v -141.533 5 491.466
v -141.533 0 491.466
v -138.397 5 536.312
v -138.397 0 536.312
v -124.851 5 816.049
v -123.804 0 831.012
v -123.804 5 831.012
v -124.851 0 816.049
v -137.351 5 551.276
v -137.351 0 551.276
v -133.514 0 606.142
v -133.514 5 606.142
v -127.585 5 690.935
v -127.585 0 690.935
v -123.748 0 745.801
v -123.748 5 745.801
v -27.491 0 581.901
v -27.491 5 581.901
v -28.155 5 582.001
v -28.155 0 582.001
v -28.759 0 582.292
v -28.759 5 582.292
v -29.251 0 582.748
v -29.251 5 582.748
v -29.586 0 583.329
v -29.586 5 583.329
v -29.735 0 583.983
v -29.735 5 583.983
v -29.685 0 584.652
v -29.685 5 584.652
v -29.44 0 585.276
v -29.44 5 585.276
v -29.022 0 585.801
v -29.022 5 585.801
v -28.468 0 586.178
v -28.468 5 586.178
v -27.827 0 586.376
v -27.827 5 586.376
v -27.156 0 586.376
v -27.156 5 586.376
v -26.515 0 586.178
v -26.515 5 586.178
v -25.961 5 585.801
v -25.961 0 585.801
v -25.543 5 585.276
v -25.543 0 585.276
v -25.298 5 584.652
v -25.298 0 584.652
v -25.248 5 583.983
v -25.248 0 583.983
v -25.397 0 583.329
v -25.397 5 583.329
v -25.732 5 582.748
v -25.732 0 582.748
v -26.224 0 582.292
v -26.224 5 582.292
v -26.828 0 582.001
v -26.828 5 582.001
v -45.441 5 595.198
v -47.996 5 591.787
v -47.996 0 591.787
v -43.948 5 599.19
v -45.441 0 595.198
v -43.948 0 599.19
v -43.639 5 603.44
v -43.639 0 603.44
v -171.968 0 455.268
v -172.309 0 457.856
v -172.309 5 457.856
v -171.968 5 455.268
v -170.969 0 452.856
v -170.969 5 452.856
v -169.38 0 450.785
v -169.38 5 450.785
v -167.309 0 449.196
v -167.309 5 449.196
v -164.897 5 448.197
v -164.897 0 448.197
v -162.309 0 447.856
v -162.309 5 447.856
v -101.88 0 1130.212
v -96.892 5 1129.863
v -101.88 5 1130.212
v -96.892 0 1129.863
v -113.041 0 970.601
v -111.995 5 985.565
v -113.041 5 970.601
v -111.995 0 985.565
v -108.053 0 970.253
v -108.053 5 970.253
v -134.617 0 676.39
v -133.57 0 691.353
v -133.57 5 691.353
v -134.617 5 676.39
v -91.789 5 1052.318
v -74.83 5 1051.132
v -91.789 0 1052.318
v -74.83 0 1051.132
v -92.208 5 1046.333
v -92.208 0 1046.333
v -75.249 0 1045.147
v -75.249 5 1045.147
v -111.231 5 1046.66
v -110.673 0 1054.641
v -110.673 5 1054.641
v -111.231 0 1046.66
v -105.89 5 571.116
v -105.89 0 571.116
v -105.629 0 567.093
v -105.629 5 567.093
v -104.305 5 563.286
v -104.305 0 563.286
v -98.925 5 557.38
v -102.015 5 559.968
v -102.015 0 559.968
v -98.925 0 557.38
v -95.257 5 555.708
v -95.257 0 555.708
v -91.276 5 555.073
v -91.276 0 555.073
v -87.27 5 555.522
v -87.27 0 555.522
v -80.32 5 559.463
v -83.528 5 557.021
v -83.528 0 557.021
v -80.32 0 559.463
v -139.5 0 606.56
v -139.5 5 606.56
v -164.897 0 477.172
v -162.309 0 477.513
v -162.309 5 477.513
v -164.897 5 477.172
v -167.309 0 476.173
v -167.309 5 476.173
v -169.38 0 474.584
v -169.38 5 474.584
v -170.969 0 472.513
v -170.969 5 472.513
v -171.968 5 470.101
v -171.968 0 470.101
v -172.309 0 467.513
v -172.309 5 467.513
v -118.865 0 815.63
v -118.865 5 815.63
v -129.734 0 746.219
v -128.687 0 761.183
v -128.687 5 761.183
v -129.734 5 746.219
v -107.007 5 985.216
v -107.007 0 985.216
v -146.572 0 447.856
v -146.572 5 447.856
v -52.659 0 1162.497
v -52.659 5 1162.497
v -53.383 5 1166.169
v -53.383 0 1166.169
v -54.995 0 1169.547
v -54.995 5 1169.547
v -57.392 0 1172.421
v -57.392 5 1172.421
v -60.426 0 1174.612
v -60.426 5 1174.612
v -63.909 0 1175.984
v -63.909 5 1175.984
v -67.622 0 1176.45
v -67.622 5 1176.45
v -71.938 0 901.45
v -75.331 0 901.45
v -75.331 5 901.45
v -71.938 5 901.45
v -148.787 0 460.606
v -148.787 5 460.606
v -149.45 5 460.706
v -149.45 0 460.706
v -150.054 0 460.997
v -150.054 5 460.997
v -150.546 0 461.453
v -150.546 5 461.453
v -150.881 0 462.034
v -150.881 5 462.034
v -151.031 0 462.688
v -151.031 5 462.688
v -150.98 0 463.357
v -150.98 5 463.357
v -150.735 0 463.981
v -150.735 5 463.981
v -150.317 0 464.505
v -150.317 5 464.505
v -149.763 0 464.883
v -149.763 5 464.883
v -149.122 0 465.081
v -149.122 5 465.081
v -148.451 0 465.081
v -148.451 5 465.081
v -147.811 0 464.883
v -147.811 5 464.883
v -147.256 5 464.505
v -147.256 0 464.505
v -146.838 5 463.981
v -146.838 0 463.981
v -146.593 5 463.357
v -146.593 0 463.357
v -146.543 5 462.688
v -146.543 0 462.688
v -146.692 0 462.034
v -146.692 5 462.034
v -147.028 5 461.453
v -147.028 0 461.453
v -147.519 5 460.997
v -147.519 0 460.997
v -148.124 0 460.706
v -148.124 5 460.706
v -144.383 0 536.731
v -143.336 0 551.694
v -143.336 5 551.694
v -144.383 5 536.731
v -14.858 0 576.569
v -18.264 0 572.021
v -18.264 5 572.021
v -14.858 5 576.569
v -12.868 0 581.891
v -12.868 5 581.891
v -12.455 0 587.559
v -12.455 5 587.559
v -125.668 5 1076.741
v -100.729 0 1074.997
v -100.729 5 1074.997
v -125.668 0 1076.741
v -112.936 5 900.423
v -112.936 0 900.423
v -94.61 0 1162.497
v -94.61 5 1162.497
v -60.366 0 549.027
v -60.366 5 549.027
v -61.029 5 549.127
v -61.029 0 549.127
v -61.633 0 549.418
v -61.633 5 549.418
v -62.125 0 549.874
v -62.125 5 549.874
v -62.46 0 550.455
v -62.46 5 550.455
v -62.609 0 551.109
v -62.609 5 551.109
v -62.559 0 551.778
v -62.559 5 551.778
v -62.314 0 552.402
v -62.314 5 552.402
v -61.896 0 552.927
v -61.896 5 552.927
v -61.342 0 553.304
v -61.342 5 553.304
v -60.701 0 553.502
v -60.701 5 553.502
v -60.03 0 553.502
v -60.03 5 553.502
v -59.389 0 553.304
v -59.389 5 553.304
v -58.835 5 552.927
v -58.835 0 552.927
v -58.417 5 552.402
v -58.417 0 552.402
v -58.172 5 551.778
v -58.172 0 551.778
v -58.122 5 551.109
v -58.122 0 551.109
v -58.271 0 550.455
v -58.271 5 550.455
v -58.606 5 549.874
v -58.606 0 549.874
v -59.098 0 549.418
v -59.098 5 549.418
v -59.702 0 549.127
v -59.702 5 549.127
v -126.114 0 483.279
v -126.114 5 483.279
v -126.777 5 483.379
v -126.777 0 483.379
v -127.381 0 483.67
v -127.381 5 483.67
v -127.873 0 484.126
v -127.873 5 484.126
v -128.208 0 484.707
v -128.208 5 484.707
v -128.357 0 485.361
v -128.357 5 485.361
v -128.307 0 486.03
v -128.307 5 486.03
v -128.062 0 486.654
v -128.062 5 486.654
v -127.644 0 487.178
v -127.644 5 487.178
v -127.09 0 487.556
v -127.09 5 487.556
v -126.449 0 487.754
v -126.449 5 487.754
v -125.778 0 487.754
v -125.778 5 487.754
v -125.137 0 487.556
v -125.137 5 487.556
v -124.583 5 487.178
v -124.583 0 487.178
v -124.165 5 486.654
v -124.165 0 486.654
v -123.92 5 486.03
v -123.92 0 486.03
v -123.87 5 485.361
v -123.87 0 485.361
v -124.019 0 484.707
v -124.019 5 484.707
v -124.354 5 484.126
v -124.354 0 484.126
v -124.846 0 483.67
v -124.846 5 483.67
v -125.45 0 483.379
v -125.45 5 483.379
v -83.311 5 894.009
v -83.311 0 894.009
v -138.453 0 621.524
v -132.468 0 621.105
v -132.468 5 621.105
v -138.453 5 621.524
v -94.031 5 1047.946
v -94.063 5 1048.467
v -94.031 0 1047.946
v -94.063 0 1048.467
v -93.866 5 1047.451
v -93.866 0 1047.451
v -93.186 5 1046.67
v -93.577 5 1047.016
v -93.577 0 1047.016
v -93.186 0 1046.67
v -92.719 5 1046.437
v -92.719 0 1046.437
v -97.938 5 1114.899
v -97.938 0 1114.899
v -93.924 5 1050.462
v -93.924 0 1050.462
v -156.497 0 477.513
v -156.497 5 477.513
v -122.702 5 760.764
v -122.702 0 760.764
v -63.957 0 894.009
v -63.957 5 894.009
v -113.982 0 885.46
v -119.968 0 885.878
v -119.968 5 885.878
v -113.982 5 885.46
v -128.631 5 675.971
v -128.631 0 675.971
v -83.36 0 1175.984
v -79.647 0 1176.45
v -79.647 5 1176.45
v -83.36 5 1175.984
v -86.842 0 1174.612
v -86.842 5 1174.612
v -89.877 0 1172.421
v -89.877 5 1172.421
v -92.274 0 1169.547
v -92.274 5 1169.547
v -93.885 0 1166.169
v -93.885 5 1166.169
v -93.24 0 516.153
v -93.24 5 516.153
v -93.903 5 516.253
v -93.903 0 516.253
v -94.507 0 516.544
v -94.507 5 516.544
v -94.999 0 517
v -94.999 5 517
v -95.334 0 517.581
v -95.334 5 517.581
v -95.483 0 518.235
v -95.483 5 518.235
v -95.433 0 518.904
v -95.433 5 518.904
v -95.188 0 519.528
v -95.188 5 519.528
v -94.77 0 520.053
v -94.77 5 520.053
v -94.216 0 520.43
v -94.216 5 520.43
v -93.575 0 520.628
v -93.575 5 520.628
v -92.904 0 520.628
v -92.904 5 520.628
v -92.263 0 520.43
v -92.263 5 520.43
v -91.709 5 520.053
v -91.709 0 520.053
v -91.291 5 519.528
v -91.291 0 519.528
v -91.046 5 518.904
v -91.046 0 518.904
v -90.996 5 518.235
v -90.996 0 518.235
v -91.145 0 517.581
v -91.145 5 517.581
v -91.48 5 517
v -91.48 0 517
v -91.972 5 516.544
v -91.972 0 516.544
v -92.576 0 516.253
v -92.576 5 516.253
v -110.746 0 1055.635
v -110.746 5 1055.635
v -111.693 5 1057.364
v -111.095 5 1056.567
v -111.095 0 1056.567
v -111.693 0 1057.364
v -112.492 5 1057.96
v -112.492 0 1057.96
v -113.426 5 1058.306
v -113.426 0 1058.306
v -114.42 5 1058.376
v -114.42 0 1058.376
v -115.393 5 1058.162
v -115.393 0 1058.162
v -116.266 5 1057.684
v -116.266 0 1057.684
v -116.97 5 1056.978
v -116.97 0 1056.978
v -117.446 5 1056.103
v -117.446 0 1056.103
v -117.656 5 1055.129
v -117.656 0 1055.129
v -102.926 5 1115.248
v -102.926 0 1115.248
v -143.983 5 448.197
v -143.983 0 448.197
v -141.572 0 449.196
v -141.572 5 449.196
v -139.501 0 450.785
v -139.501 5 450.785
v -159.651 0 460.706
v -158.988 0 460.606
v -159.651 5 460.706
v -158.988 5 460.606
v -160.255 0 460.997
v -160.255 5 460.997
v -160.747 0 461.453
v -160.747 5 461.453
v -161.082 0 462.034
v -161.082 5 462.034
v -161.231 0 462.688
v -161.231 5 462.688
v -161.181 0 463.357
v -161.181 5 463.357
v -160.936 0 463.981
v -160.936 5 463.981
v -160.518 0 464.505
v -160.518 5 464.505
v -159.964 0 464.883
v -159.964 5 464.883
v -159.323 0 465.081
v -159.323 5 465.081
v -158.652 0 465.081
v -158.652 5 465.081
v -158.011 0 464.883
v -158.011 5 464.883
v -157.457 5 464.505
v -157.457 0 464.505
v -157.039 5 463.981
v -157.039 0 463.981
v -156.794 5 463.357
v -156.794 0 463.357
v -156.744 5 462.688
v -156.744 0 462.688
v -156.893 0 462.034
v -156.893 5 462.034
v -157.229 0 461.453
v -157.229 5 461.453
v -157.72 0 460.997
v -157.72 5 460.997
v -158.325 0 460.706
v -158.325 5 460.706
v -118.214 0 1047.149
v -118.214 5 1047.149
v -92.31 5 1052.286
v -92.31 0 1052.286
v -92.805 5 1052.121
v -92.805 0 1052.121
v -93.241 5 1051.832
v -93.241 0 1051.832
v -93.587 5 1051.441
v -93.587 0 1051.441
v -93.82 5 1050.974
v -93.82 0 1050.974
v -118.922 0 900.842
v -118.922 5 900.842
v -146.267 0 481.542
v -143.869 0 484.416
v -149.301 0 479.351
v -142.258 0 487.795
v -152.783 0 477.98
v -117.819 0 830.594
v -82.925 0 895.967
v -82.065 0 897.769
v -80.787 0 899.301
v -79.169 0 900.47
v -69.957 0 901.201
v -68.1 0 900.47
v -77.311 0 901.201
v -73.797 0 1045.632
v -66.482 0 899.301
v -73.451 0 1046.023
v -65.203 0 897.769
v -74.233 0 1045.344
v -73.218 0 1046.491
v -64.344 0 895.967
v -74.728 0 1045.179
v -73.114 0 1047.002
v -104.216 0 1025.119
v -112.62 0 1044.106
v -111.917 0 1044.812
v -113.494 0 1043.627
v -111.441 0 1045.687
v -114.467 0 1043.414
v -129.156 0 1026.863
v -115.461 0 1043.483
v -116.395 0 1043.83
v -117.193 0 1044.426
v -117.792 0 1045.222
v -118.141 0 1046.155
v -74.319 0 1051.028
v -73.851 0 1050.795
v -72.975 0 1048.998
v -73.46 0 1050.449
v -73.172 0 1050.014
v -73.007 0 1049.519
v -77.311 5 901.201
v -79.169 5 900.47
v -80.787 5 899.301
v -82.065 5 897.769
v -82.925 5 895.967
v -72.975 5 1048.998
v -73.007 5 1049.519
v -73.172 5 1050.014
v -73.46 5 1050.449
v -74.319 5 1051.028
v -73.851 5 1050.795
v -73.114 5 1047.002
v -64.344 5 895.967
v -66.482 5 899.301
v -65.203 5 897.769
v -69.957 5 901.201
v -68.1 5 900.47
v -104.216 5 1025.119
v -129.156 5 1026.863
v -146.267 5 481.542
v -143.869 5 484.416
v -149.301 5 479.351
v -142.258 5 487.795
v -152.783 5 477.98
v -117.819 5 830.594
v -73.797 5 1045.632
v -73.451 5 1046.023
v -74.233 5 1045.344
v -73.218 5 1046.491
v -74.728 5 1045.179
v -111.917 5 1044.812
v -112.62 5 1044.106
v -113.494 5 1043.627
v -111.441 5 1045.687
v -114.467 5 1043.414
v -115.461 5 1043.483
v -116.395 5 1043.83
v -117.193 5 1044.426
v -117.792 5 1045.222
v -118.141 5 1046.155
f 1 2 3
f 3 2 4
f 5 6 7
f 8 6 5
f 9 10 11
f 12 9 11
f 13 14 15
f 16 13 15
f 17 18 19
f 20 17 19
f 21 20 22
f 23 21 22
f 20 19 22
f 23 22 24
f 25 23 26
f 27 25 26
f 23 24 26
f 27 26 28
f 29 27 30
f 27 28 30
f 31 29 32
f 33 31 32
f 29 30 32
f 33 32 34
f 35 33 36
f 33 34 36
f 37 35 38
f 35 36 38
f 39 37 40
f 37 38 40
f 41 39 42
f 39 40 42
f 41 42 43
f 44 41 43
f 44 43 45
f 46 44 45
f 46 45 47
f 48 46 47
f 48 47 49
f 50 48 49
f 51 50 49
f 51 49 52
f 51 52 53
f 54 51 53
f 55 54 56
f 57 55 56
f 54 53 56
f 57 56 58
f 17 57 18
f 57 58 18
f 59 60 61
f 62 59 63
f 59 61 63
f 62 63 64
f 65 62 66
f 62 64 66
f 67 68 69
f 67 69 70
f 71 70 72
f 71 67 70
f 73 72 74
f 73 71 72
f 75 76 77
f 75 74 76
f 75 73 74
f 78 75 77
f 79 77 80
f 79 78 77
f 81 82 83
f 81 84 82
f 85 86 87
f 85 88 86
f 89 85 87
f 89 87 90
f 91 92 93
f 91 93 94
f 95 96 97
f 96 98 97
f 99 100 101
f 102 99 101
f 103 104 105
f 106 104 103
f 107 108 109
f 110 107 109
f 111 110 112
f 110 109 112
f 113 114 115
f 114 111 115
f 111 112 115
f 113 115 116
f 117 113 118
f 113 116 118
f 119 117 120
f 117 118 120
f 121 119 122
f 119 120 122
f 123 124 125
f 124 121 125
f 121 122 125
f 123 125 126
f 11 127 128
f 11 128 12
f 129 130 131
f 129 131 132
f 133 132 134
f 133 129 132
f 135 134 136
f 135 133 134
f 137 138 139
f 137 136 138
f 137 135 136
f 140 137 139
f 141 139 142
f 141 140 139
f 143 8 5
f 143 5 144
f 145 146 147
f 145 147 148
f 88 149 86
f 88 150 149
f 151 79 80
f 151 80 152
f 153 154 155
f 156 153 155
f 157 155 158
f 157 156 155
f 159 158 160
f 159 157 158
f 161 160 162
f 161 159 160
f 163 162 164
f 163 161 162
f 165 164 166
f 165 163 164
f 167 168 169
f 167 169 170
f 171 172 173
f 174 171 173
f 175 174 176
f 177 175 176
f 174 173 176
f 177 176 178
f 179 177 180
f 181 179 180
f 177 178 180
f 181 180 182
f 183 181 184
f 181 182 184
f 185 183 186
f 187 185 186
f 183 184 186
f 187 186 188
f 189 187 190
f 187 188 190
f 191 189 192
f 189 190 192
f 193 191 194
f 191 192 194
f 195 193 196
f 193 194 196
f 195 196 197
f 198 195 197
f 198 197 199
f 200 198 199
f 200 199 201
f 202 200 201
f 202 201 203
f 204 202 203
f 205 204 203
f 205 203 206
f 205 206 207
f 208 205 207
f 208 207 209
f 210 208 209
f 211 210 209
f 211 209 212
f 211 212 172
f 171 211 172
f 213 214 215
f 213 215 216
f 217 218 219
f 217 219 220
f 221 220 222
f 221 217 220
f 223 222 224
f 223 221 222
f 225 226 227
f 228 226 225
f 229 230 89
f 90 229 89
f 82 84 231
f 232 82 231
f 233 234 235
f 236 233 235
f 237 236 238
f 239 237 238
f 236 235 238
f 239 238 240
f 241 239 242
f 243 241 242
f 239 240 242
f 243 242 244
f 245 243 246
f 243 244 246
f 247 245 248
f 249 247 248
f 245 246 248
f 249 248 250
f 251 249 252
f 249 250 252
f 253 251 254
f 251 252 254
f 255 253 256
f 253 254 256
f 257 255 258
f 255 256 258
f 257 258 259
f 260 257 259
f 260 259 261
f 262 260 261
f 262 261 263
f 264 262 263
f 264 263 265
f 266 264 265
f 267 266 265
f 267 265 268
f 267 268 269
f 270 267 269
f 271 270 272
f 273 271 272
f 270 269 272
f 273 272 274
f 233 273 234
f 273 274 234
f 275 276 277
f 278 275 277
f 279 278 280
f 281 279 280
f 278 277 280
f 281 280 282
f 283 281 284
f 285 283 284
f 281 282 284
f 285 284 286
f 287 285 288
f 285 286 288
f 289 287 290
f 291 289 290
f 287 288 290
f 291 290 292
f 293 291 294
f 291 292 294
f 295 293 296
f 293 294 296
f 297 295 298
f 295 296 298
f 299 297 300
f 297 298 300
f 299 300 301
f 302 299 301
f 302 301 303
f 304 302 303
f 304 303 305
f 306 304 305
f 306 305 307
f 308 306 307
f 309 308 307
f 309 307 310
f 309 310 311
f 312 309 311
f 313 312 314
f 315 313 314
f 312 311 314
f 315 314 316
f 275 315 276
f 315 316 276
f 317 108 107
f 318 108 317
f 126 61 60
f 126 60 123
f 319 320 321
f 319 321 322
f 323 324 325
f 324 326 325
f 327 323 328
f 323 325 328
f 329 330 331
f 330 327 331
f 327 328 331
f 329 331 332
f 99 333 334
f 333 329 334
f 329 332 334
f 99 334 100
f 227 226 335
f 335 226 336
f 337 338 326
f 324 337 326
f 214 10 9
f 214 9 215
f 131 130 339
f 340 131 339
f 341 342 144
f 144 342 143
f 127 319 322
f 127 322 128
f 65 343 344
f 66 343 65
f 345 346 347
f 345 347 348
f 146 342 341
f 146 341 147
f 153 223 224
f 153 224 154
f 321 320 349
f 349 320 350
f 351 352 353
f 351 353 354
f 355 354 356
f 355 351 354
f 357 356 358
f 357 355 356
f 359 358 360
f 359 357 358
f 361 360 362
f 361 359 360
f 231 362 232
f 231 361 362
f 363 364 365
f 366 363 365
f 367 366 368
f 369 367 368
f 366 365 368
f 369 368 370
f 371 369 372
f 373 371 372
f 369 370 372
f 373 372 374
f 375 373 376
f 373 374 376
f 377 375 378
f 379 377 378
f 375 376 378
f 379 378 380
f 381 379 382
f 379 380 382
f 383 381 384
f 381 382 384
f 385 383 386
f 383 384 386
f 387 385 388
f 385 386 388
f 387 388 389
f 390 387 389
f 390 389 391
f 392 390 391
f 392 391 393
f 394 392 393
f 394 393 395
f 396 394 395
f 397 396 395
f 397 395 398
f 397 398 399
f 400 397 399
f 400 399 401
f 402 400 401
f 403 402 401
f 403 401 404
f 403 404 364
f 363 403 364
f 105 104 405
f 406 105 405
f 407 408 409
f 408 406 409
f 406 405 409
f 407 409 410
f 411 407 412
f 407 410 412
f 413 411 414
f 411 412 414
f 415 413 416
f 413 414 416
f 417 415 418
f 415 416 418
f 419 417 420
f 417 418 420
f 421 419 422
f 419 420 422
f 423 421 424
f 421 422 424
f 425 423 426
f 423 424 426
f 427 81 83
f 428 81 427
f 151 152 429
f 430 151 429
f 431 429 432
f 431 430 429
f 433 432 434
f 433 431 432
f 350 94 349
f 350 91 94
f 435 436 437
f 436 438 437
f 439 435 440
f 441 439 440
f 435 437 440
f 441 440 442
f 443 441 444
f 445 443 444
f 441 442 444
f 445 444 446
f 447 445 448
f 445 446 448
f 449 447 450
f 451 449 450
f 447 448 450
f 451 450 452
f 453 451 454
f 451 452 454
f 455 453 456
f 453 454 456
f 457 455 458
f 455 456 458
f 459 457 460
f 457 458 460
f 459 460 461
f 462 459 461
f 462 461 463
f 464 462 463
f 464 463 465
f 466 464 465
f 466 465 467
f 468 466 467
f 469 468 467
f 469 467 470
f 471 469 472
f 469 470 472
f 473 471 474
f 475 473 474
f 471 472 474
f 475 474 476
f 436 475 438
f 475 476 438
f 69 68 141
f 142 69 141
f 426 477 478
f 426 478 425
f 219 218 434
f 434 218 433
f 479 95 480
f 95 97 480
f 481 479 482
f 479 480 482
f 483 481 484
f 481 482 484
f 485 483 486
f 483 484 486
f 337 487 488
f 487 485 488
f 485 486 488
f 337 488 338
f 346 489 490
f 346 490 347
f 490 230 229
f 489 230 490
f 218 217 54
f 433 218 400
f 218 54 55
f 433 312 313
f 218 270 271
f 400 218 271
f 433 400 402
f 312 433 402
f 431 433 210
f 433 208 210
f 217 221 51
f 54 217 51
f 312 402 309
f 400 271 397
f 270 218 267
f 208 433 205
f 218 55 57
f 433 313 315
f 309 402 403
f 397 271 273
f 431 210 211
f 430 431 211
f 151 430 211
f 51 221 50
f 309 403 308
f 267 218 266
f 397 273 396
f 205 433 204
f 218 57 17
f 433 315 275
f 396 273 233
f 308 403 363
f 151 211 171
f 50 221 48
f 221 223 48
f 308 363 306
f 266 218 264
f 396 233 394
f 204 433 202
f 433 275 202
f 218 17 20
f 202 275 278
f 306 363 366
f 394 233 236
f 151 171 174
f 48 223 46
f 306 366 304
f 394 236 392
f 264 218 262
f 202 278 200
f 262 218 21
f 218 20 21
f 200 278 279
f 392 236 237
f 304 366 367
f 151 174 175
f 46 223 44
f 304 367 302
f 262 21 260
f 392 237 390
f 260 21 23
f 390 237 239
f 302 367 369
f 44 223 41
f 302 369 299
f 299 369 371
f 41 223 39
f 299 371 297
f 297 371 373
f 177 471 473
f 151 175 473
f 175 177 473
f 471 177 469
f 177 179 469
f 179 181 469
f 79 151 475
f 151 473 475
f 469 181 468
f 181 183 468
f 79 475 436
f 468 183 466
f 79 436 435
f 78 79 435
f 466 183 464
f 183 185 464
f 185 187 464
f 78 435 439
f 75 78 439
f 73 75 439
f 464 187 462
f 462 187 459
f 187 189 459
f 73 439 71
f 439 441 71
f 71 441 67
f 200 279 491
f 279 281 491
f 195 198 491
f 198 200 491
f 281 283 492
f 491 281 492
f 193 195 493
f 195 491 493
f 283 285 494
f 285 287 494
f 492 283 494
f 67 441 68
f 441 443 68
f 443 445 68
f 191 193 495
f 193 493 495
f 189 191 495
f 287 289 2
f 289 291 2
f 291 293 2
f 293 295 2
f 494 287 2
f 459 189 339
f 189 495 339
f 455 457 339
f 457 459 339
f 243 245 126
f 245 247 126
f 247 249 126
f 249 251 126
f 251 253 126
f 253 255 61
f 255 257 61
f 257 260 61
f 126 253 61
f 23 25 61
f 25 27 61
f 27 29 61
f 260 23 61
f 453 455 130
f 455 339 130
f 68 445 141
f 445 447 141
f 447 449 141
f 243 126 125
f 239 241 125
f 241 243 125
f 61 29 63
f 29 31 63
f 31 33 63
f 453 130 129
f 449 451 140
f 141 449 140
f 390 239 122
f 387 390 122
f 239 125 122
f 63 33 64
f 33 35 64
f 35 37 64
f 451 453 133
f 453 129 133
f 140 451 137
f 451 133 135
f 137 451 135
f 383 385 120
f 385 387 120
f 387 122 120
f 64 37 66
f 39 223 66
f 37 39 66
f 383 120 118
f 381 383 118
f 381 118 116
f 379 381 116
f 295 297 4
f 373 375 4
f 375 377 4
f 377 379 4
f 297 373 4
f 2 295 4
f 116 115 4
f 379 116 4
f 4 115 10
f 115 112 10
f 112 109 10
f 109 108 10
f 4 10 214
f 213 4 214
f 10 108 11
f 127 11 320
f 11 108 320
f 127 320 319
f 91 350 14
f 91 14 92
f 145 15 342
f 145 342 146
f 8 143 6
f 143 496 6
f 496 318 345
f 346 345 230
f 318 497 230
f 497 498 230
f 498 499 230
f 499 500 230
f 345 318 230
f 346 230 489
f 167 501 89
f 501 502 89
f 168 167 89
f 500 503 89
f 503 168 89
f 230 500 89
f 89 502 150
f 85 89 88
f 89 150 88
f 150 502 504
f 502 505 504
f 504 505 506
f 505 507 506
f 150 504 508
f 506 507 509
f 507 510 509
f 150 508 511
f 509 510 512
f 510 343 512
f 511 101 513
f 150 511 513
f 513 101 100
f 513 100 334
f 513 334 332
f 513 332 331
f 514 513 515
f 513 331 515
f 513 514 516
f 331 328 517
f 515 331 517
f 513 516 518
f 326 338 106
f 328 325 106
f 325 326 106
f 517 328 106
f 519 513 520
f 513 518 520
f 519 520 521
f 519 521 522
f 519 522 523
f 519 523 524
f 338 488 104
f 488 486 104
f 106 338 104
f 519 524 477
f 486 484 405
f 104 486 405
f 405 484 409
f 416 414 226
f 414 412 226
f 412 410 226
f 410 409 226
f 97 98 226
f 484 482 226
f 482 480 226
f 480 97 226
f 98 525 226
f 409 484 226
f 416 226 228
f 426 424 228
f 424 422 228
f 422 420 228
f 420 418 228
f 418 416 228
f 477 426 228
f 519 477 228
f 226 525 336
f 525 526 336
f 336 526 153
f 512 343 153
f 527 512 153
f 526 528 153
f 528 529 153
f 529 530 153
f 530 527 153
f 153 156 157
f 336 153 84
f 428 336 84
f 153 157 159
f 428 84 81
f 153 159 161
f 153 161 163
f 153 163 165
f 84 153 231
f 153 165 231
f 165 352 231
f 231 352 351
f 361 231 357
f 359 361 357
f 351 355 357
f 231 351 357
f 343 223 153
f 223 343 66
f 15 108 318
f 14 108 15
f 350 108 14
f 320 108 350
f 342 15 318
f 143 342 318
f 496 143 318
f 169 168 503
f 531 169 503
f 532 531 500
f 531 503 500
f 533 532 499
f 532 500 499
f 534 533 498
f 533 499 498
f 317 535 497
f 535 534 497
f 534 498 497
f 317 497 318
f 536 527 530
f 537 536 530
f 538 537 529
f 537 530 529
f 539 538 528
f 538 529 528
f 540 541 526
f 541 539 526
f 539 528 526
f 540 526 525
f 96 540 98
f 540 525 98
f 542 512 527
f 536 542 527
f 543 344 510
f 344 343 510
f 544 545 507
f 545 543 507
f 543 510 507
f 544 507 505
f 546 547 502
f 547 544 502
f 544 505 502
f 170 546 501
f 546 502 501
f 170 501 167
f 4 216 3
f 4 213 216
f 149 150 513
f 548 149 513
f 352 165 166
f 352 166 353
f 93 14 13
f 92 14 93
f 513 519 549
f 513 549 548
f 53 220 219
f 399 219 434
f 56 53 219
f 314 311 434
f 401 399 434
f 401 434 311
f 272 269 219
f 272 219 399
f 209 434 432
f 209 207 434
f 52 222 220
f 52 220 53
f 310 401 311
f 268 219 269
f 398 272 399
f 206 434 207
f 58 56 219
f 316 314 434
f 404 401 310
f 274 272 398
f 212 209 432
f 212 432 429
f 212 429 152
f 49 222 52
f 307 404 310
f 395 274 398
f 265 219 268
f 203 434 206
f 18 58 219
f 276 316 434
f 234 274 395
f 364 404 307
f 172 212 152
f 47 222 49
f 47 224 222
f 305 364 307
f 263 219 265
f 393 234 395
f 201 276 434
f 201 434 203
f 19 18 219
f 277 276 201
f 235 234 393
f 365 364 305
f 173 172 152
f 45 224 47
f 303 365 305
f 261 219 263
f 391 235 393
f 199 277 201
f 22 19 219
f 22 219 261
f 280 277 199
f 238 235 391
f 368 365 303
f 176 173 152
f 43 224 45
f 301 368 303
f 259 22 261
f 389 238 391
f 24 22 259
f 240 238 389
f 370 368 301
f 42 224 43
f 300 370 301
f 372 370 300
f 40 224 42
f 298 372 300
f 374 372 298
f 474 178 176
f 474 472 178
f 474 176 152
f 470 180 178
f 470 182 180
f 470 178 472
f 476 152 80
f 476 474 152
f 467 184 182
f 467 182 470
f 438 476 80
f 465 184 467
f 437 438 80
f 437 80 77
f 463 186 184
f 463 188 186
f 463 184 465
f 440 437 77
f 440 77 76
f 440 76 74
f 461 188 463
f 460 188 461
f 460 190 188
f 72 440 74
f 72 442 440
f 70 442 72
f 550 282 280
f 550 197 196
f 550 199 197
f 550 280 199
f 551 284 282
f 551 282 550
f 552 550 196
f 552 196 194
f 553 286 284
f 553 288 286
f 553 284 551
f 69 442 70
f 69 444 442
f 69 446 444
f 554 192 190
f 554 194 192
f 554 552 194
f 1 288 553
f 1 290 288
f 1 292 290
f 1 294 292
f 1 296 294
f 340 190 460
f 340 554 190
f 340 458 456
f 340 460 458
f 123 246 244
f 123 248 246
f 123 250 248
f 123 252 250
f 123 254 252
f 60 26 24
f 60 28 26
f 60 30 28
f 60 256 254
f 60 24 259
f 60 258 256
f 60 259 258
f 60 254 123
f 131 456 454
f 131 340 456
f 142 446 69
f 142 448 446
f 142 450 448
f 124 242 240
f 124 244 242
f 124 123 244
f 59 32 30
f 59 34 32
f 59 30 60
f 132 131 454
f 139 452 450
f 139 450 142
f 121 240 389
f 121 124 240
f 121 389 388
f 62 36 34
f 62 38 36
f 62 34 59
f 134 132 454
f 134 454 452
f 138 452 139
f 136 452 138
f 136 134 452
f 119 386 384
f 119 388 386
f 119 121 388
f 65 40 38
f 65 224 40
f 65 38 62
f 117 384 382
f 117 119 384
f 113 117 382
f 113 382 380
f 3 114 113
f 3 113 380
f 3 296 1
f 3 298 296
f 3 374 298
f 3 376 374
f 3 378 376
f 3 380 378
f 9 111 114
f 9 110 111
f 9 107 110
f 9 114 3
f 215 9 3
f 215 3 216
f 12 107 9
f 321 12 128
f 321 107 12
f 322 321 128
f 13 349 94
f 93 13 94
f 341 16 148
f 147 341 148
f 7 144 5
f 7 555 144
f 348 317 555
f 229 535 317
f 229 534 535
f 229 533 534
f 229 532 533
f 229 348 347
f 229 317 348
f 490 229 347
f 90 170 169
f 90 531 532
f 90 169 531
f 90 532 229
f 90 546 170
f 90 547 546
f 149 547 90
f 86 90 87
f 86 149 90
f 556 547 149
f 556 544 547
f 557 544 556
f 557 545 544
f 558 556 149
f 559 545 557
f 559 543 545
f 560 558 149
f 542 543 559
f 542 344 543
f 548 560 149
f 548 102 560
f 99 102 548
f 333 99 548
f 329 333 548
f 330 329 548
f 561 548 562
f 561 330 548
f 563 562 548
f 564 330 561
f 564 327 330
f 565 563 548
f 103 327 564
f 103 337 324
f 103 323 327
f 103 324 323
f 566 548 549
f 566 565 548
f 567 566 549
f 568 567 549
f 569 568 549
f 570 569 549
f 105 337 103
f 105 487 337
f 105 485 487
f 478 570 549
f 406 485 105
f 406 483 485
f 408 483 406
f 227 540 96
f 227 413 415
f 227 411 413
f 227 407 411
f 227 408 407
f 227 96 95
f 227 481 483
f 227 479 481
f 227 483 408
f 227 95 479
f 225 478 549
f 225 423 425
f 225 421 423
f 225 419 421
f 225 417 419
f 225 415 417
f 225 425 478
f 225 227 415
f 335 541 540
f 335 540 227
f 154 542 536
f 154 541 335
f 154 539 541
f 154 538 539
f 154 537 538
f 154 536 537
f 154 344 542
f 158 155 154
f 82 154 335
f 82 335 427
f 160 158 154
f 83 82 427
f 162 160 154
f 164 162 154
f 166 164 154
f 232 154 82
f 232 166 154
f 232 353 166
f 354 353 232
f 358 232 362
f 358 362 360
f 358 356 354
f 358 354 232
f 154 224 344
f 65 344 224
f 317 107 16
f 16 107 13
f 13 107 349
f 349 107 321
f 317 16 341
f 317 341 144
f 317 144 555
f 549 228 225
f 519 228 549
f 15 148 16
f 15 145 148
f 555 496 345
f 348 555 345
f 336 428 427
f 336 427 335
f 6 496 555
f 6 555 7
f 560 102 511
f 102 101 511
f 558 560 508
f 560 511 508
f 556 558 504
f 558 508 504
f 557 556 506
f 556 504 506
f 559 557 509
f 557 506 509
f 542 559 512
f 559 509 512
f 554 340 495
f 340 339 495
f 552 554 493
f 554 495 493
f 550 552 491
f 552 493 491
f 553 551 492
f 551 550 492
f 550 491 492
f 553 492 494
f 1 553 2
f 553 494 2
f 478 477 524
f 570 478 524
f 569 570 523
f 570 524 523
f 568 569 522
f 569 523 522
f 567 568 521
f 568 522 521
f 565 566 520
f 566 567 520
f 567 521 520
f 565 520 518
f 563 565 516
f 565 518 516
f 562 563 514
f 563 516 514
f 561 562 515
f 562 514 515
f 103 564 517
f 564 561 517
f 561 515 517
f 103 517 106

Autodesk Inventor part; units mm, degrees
ref_plane "YZ Plane" through (0, 0, 0) normal (1, 0, 0) x (0, 1, 0)
ref_plane "XZ Plane" through (0, 0, 0) normal (0, 1, 0) x (-1, 0, 0)
ref_plane "XY Plane" through (0, 0, 0) normal (0, 0, 1) x (1, 0, 0)
sketch "Szkic1" plane through (0, 0, 0) normal (0, 1, 0) x (-1, 0, 0)
  line L0 (-19, 622) -> (11, 622) construction
  line L1 (11, 622) -> (147, 486) construction
  line L2 (147, 486) -> (176.8016, 486) construction
  line L3 (176.8016, 486) -> (176.8016, 461) construction
  line L4 (-19, 622) -> (-19, 609.2855) construction
  line L5 (-19, 609.2855) -> (176.8016, 413.4839) construction
  line L6 (176.8016, 413.4839) -> (176.8016, 461) construction
  line L7 (176.8016, 486) -> (176.8016, 1189) construction
  line L8 (146.8016, 1189) -> (146.8016, 533) construction
  line L9 (246.8016, 495.9837) -> (246.8016, 1189) construction
  line L10 (-47, 922) -> (309, 922) construction
  line L11 (-42, 1147) -> (293, 1147) construction
  line L12 (12.455, 587.5586) -> (52.6586, 1162.4969)
  line L13 (67.6221, 1176.4505) -> (79.6466, 1176.4505)
  line L14 (147, 486) -> (147, 443.2855) construction
  line L15 (147, 486) -> (142.6159, 490.3841) construction
  line L16 (142.6159, 490.3841) -> (121.2587, 469.0268) construction
  line L17 (18.2642, 572.0213) -> (139.5006, 450.7849)
  line L18 (-99.7145, 690) -> (195.2855, 395) construction
  line L19 (172.3089, 417.9767) -> (172.3089, 447.856) construction
  line L20 (176.8016, 486) -> (315.5485, 347.2531) construction
  line L21 (141.5331, 491.4664) -> (138.3972, 536.3123)
  line L22 (162.3089, 477.5127) -> (156.4966, 477.5127)
  line L23 (162.3089, 447.856) -> (146.5717, 447.856)
  arc A0 (12.455, 587.5586) -> (18.2642, 572.0213) centre (32.4063, 586.1635) ccw
  line L24 (142.4296, 447.856) -> (172.3089, 417.9767) construction
  line L25 (172.3089, 457.856) -> (172.3089, 467.5127)
  arc A1 (141.5331, 491.4664) -> (156.4966, 477.5127) centre (156.4966, 492.5127) ccw
  arc A2 (172.3089, 467.5127) -> (162.3089, 477.5127) centre (162.3089, 467.5127) ccw
  arc A3 (162.3089, 447.856) -> (172.3089, 457.856) centre (162.3089, 457.856) ccw
  arc A4 (139.5006, 450.7849) -> (146.5717, 447.856) centre (146.5717, 457.856) ccw
  arc A5 (94.6101, 1162.4969) -> (79.6466, 1176.4505) centre (79.6466, 1161.4505) ccw
  arc A6 (67.6221, 1176.4505) -> (52.6586, 1162.4969) centre (67.6221, 1161.4505) ccw
  line L26 (141.5331, 491.4664) -> (144.7446, 445.541) construction
  line L27 (141.5331, 491.4664) -> (141.5331, 448.7524) construction
  line L28 (-28.6025, 640.2452) -> (163.5033, 448.1395) construction
  line L29 (47.7855, 542.5) -> (47.7855, 585.2145) construction
  line L30 (-4, 664.8499) -> (-4, 551.9978) construction
  line L31 (11, 622) -> (11, 579.2855) construction
  line L32 (11, 579.2855) -> (15.3841, 574.9015) construction
  line L33 (15.3841, 574.9015) -> (36.7413, 596.2587) construction
  line L34 (161.8016, 495.9837) -> (161.8016, 402) construction
  line L35 (104.2165, 1025.1187) -> (100.7287, 1074.9969) construction
  line L36 (100.7287, 1074.9969) -> (125.6678, 1076.7408)
  line L37 (125.6678, 1076.7408) -> (129.1556, 1026.8626)
  line L38 (129.1556, 1026.8626) -> (104.2165, 1025.1187)
  line L39 (100.7287, 1074.9969) -> (97.9384, 1114.8994)
  line L40 (104.2165, 1025.1187) -> (100.7287, 1074.9969) construction
  line L41 (73.1142, 1047.0024) -> (72.9747, 1048.9975)
  line L42 (74.8303, 1051.1322) -> (91.7889, 1052.318)
  line L43 (93.9236, 1050.4624) -> (94.0631, 1048.4673)
  line L44 (92.2075, 1046.3326) -> (75.2489, 1045.1468)
  line L45 (93.9933, 1049.4649) -> (102.4726, 1050.0578) construction
  line L46 (102.4726, 1050.0578) -> (114.4434, 1050.8949) construction
  arc A7 (74.8303, 1051.1322) -> (72.9747, 1048.9975) centre (74.9699, 1049.137) ccw
  arc A8 (73.1142, 1047.0024) -> (75.2489, 1045.1468) centre (75.1094, 1047.1419) ccw
  arc A9 (93.9236, 1050.4624) -> (91.7889, 1052.318) centre (91.9284, 1050.3229) ccw
  arc A10 (92.2075, 1046.3326) -> (94.0631, 1048.4673) centre (92.068, 1048.3278) ccw
  line L47 (116.505, 1021.4131) -> (111.1905, 1097.4131) construction
  line L48 (114.9666, 1043.4131) -> (113.9202, 1058.3766) construction
  line L49 (118.2139, 1047.1488) -> (117.6558, 1055.1293)
  line L50 (110.6729, 1054.641) -> (111.2309, 1046.6605)
  arc A11 (111.2309, 1046.6605) -> (118.2139, 1047.1488) centre (114.7224, 1046.9046) ccw
  arc A12 (117.6558, 1055.1293) -> (110.6729, 1054.641) centre (114.1644, 1054.8851) ccw
  line L51 (47.9957, 591.7873) -> (80.3202, 559.4628)
  line L52 (105.8902, 571.1158) -> (83.3114, 894.0086)
  line L53 (75.3309, 901.4505) -> (71.9379, 901.4505)
  line L54 (63.9574, 894.0086) -> (43.6388, 603.4402)
  arc A13 (43.6388, 603.4402) -> (47.9957, 591.7873) centre (58.6023, 602.3939) ccw
  arc A14 (80.3202, 559.4628) -> (105.8902, 571.1158) centre (90.9268, 570.0694) ccw
  arc A15 (83.3114, 894.0086) -> (75.3309, 901.4505) centre (75.3309, 893.4505) ccw
  arc A16 (71.9379, 901.4505) -> (63.9574, 894.0086) centre (71.9379, 893.4505) ccw
  line L55 (97.9384, 1114.8994) -> (96.8921, 1129.8629) construction
  line L56 (96.8921, 1129.8629) -> (101.8799, 1130.2117)
  line L57 (101.8799, 1130.2117) -> (102.9263, 1115.2482)
  line L58 (102.9263, 1115.2482) -> (97.9384, 1114.8994)
  line L59 (97.9384, 1114.8994) -> (112.9384, 1114.8994) construction
  line L60 (97.9384, 1114.8994) -> (96.8921, 1129.8629) construction
  line L61 (96.8921, 1129.8629) -> (94.6101, 1162.4969)
  line L62 (107.0068, 985.2161) -> (111.9946, 985.5649)
  line L63 (111.9946, 985.5649) -> (113.041, 970.6014)
  line L64 (113.041, 970.6014) -> (108.0531, 970.2527)
  line L65 (107.0068, 985.2161) -> (104.2165, 1025.1187)
  line L66 (108.0531, 970.2527) -> (107.0068, 985.2161) construction
  line L67 (138.3972, 536.3123) -> (137.3509, 551.2758)
  line L68 (137.3509, 551.2758) -> (143.3362, 551.6943)
  line L69 (143.3362, 551.6943) -> (144.3826, 536.7308)
  line L70 (144.3826, 536.7308) -> (138.3972, 536.3123)
  line L71 (138.3972, 536.3123) -> (153.3972, 536.3123) construction
  line L72 (131.9463, 1052.1188) -> (62.9796, 1047.2962) construction
  line L73 (137.3509, 551.2758) -> (108.0531, 970.2527)
  line L74 (138.3972, 536.3123) -> (137.3509, 551.2758) construction
  line L75 (138.4533, 621.5238) -> (139.4996, 606.5603)
  line L76 (139.4996, 606.5603) -> (133.5142, 606.1418)
  line L77 (132.4679, 621.1052) -> (138.4533, 621.5238)
  line L78 (133.5142, 606.1418) -> (132.4679, 621.1052)
  line L79 (133.5703, 691.3533) -> (134.6167, 676.3898)
  line L80 (134.6167, 676.3898) -> (128.6313, 675.9713)
  line L81 (127.5849, 690.9347) -> (133.5703, 691.3533)
  line L82 (128.6313, 675.9713) -> (127.5849, 690.9347)
  line L83 (128.6874, 761.1827) -> (129.7337, 746.2193)
  line L84 (129.7337, 746.2193) -> (123.7483, 745.8007)
  line L85 (122.702, 760.7642) -> (128.6874, 761.1827)
  line L86 (123.7483, 745.8007) -> (122.702, 760.7642)
  line L87 (123.8044, 831.0122) -> (124.8508, 816.0488)
  line L88 (124.8508, 816.0488) -> (118.8654, 815.6302)
  line L89 (117.819, 830.5937) -> (123.8044, 831.0122)
  line L90 (118.8654, 815.6302) -> (117.819, 830.5937)
  line L91 (118.9215, 900.8417) -> (119.9678, 885.8783)
  line L92 (119.9678, 885.8783) -> (113.9824, 885.4597)
  line L93 (112.9361, 900.4232) -> (118.9215, 900.8417)
  line L94 (113.9824, 885.4597) -> (112.9361, 900.4232)
  point P0 (0, 0)
  point P1 (11.8192, 578.4663)
  point P2 (53.6344, 1176.4505)
  point P3 (93.6344, 1176.4505)
  point P4 (172.3089, 477.5127)
  point P5 (142.5089, 477.5127)
  point P6 (47.7855, 563.8572)
  point P7 (27.4914, 584.1513)
  point P8 (148.7868, 462.856)
  point P9 (158.9877, 462.856)
  point P10 (93.2396, 518.4032)
  point P11 (60.3655, 551.2773)
  point P12 (126.1136, 485.5291)
  point P13 (72.8352, 1050.9927)
  point P14 (93.7841, 1052.4575)
  point P15 (118.4866, 1051.1776)
  dimension "d0" = 30
  dimension "d1" = 100
  dimension "d2" = 225
  dimension "d3" = 300
  dimension "d4" = 40
  dimension "d5" = 6.2
  dimension "d14" = 94
  dimension "d16" = 94
  dimension "d18" = 29.8
  dimension "d22" = 700.6445
  dimension "d23" = 20
  dimension "d24" = 15
  dimension "d25" = 10
  dimension "d26" = 10
  dimension "d28" = 15.7372
  dimension "d29" = 15
  dimension "d30" = 42.714
  dimension "d31" = 42.7145
  dimension "d32" = 21.3572
  dimension "d33" = 30
  dimension "d34" = 15
  dimension "d35" = 6.2
  dimension "d39" = 15.0364
  dimension "d40" = 15
  dimension "d43" = 23.5221
  dimension "d45" = 13.3212
  dimension "d46" = 15
  dimension "d47" = 131.4963
  dimension "d48" = 65.7481
  dimension "d49" = 32.8741
  dimension "d50" = 32.8741
  dimension "d51" = 50
  dimension "d52" = 25
  dimension "d53" = 87.5
  dimension "d56" = 21
  dimension "d57" = 8.5
  dimension "d58" = 12
  dimension "d60" = 2
  dimension "d62" = 6
  dimension "d63" = 15
  dimension "d64" = 7
  dimension "d65" = 25
  dimension "d66" = 275
  dimension "d67" = 30
  dimension "d68" = 30
  dimension "d69" = 35
  dimension "d70" = 15
  dimension "d71" = 8
  dimension "d72" = 15
  dimension "d73" = 94
  dimension "d74" = 5
  dimension "d75" = 40
  dimension "d78" = 145
  dimension "d83" = 15
  dimension "d84" = 94
  dimension "d85" = 6
  dimension "d86" = 3
  dimension "d87" = 16.014
  dimension "d88" = 25
  dimension "d99" = 70
  dimension "d113" = 420
extrude "Wyciągnięcie proste1" add sketch "Szkic1" along normal blind 5
hole "Otwór1" at (-27.4914, 0, 584.1513) at (-148.7868, 0, 462.856) at (-158.9877, 0, 462.856) at (-93.2396, 0, 518.4032) at (-60.3655, 0, 551.2773) at (-126.1136, 0, 485.5291) direction (0, 1, 0) diameter 4.5 depth 8 tip angle 118 clearance for "Śruba ze łbem płaskim obrobiona" size "M4" standard "ANSI Profil metryczny M"
equation "\"d16\" = d14"
properties part number "nowy_bok"
